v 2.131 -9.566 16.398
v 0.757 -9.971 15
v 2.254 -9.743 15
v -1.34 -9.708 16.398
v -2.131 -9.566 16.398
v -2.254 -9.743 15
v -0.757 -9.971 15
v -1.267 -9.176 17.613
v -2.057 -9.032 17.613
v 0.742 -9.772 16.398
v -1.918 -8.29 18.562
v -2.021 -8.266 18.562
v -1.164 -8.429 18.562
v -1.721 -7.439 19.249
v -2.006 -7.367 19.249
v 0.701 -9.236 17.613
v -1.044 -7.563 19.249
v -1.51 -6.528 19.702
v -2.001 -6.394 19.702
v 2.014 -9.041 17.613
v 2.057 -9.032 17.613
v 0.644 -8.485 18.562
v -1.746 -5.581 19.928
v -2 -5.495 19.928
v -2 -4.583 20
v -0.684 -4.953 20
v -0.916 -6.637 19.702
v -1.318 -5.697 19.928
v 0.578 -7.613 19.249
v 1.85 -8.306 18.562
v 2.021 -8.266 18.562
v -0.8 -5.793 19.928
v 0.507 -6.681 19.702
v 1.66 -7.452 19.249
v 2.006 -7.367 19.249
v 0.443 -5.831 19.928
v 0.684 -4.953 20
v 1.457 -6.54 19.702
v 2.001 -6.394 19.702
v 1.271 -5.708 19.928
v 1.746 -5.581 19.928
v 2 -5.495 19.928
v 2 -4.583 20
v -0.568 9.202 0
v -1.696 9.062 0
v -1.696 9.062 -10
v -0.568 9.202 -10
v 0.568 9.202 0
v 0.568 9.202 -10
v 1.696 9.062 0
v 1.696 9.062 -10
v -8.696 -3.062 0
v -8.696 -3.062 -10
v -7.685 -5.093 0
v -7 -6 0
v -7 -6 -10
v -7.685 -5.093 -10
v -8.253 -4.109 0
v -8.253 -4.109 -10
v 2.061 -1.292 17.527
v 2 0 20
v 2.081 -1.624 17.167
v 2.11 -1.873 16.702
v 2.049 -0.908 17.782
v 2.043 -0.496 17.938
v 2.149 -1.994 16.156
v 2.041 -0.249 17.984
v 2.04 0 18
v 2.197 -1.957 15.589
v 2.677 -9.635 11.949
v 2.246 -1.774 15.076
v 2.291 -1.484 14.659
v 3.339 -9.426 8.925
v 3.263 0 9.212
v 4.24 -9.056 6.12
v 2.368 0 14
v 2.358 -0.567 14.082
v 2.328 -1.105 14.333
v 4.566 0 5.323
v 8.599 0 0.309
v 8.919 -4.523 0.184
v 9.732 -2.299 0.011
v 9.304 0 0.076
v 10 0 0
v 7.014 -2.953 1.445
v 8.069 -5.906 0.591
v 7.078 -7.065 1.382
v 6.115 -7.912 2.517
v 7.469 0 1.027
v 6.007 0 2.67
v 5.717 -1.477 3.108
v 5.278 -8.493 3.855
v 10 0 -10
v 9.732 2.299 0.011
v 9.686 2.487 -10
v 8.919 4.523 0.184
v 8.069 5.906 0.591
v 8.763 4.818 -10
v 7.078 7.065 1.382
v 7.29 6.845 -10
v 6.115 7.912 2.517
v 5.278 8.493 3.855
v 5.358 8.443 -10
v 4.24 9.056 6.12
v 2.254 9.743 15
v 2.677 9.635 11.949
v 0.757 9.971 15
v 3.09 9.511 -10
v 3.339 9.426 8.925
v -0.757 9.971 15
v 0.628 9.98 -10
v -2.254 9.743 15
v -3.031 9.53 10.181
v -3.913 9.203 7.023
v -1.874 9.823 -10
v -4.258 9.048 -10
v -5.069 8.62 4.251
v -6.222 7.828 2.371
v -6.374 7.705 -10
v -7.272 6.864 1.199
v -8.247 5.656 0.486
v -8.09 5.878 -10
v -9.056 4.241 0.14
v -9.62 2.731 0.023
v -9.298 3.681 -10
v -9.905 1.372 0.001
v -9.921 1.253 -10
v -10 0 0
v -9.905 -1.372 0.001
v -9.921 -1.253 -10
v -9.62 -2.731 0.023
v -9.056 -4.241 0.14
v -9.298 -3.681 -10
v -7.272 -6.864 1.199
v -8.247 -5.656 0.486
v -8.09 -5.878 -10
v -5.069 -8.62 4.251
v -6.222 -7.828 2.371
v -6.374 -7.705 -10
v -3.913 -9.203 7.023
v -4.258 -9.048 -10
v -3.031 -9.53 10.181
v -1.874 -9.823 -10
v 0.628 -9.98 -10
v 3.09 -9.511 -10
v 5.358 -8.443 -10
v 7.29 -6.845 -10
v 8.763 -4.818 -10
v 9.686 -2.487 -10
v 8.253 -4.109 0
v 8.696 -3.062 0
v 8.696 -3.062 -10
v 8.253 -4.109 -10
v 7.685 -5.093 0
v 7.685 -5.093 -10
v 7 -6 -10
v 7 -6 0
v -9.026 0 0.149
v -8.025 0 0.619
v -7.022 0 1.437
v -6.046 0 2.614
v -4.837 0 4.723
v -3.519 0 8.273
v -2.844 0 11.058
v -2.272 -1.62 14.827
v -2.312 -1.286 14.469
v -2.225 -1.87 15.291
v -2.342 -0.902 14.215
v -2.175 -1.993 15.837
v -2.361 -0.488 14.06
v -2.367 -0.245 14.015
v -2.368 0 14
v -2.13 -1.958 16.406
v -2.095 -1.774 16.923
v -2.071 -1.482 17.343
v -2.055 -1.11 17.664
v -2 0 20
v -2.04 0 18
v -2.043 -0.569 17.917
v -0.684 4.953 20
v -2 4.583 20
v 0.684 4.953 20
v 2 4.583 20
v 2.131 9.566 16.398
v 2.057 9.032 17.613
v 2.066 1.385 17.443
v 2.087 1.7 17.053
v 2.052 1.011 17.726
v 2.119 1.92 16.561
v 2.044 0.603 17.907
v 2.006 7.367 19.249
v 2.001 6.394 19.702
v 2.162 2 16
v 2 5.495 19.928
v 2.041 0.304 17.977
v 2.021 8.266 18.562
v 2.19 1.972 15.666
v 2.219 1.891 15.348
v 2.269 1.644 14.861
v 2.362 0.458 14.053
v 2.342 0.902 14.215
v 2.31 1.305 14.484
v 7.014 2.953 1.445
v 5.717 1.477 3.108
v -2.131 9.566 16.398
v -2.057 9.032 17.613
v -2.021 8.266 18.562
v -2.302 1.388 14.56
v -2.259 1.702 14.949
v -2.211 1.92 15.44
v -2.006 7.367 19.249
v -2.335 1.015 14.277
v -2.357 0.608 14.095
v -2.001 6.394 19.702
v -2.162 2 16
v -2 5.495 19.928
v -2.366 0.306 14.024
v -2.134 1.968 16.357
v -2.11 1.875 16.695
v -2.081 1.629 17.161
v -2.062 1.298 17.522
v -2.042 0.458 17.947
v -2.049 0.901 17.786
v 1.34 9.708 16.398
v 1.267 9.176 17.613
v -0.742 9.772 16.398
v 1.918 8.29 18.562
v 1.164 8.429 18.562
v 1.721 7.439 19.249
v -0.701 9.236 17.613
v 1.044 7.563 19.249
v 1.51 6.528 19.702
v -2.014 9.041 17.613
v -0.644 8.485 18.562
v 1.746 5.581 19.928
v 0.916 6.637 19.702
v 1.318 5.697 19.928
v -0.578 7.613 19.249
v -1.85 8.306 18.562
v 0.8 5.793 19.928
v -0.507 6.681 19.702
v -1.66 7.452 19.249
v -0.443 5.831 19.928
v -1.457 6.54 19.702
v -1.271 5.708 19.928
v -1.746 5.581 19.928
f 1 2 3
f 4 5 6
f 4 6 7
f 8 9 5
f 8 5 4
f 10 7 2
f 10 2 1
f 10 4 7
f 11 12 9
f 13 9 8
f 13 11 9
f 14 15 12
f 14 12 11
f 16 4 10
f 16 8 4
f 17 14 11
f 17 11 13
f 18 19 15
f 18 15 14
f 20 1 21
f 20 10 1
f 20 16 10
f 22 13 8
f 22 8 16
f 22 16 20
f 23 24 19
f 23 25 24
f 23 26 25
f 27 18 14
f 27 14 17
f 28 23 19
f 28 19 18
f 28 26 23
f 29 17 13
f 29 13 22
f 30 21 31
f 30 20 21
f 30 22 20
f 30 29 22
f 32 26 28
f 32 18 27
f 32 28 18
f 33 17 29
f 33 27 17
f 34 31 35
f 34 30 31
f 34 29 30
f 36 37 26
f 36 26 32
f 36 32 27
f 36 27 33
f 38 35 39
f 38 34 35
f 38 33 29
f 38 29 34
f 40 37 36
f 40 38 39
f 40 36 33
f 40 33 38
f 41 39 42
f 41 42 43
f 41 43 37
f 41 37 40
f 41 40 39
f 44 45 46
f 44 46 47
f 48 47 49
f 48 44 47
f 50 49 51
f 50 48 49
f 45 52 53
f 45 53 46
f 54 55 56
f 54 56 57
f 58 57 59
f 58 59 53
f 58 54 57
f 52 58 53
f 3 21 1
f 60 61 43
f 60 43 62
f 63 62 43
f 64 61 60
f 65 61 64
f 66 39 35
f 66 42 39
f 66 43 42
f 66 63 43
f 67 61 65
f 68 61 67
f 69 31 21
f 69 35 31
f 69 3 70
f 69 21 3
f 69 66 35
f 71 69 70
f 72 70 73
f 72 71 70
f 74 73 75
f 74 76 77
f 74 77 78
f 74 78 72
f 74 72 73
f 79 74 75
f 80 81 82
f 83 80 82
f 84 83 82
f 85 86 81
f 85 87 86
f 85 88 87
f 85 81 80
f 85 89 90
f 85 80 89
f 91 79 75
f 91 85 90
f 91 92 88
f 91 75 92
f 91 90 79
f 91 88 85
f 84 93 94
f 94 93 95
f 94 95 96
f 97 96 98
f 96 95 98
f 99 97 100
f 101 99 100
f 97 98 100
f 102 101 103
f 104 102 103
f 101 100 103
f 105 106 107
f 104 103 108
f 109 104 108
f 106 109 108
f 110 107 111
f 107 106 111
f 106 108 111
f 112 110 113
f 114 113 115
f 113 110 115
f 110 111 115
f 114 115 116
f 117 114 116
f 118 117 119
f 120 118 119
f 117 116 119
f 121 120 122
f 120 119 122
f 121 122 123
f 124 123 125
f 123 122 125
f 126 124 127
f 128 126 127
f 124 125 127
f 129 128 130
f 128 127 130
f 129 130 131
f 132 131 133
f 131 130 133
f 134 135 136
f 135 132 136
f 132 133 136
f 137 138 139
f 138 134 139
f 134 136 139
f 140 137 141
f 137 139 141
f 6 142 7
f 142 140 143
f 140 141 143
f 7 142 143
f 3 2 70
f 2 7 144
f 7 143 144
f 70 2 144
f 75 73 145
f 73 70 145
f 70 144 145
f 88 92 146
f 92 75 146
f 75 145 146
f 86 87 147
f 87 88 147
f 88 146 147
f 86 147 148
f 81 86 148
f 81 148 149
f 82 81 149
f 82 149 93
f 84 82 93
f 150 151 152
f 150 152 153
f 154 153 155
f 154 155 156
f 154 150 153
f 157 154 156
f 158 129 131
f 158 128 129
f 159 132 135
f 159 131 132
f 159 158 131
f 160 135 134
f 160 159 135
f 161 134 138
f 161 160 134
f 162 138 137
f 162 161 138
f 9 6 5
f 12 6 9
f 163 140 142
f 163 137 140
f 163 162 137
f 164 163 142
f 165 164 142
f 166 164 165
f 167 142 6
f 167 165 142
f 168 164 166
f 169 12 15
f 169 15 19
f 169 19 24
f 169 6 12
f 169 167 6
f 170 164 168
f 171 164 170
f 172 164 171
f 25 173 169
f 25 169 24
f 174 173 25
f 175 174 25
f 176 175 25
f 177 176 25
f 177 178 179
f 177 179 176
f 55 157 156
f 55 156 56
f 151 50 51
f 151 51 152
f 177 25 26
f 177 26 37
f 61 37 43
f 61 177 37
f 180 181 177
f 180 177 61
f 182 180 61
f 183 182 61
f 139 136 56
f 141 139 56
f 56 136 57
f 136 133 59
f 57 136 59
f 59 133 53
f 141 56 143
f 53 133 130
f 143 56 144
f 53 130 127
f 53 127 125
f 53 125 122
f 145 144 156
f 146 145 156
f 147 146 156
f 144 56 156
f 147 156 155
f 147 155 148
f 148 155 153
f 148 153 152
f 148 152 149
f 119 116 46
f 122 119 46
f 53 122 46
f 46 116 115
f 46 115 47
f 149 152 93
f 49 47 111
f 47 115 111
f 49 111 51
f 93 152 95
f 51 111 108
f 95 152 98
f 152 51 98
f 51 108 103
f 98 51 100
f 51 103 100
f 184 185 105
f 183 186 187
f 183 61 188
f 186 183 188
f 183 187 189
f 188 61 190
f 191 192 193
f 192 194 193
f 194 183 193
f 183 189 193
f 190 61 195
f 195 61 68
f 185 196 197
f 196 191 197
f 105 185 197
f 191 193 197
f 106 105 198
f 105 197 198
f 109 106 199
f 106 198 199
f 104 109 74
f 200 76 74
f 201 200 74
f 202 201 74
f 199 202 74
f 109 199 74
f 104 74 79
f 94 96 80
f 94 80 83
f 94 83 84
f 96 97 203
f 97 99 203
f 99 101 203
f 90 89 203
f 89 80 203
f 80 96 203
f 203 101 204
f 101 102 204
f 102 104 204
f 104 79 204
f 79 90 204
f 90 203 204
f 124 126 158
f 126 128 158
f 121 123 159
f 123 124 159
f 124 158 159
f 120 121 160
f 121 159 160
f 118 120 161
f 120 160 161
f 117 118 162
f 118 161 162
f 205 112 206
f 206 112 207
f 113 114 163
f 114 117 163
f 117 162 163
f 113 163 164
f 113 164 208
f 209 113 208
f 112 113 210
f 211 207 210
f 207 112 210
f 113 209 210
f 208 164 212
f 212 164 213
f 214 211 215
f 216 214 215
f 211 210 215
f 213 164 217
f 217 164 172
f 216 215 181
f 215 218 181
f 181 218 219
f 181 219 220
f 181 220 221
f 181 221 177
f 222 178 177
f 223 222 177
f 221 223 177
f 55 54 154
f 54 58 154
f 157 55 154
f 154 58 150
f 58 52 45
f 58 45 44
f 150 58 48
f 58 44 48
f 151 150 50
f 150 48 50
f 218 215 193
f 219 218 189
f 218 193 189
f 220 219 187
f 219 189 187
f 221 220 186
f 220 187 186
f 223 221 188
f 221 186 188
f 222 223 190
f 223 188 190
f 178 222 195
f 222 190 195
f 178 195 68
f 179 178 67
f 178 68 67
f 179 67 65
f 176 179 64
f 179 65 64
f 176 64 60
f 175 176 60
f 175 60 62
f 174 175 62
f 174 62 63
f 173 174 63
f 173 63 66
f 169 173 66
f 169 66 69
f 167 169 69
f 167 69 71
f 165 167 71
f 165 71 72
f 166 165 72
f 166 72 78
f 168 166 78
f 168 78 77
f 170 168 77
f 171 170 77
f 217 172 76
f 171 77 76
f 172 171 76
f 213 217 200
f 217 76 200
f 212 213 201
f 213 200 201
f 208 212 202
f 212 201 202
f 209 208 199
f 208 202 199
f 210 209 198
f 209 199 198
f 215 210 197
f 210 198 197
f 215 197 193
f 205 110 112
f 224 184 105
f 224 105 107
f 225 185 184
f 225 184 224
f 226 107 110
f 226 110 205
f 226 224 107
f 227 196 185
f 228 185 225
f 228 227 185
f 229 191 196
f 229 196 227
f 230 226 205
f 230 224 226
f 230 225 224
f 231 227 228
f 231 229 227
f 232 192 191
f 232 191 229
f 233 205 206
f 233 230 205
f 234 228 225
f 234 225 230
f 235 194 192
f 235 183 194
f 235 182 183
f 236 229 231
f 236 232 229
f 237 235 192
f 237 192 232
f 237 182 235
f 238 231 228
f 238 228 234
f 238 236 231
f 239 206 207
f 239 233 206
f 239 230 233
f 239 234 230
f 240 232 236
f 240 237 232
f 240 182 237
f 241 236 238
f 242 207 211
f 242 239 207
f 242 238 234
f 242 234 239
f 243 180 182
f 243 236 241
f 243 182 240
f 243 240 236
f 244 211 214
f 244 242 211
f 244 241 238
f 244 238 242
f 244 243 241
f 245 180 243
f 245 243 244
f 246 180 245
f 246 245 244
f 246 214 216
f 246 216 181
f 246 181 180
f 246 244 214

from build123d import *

# Parameters (mm, degrees)
F2_R     = 10
F3_DEPTH = 10
F4_DEPTH = 20
F6_DEPTH = 12.5
F7_R     = 2
F8_DEPTH = 12.5
F9_R     = 5


with BuildPart() as f3:
    # F2 (on Top) → F3 (new body)
    with BuildSketch(Plane.XY):
        Circle(F2_R)
        with BuildLine():
            ThreePointArc((7, -6), (0, -9.2195444573), (-7, -6))
            ThreePointArc((-7, -6), (-7.9843597113, -4.6097722286), (-8.6961524227, -3.0621778265))
            ThreePointArc((-8.6961524227, -3.0621778265), (-7.9843597113, 4.6097722286), (-1.6961524227, 9.0621778265))
            ThreePointArc((-1.6961524227, 9.0621778265), (0, 9.2195444573), (1.6961524227, 9.0621778265))
            ThreePointArc((1.6961524227, 9.0621778265), (7.0935799378, 5.8890681492), (9.2195444573, 0))
            ThreePointArc((9.2195444573, 0), (9.0877545045, -1.553292653), (8.6961524227, -3.0621778265))
            ThreePointArc((8.6961524227, -3.0621778265), (7.9843597113, -4.6097722286), (7, -6))
        make_face(mode=Mode.SUBTRACT)
        with BuildLine():
            Line((-8.6961524227, -3.0621778265), (-5.1961524227, 3))
            Line((-5.1961524227, 3), (-1.6961524227, 9.0621778265))
            ThreePointArc((-1.6961524227, 9.0621778265), (-7.9843597113, 4.6097722286), (-8.6961524227, -3.0621778265))
        make_face()
        with BuildLine():
            Line((7, -6), (0, -6))
            Line((0, -6), (-7, -6))
            ThreePointArc((-7, -6), (0, -9.2195444573), (7, -6))
        make_face()
        with BuildLine():
            Line((1.6961524227, 9.0621778265), (5.1961524227, 3))
            Line((5.1961524227, 3), (8.6961524227, -3.0621778265))
            ThreePointArc((8.6961524227, -3.0621778265), (9.0877545045, -1.553292653), (9.2195444573, 0))
            ThreePointArc((9.2195444573, 0), (7.0935799378, 5.8890681492), (1.6961524227, 9.0621778265))
        make_face()
    extrude(amount=-F3_DEPTH)

    # F2 (on Top) → F4 (join)
    with BuildSketch(Plane.XY):
        Circle(F2_R)
        with BuildLine():
            ThreePointArc((7, -6), (0, -9.2195444573), (-7, -6))
            ThreePointArc((-7, -6), (-7.9843597113, -4.6097722286), (-8.6961524227, -3.0621778265))
            ThreePointArc((-8.6961524227, -3.0621778265), (-7.9843597113, 4.6097722286), (-1.6961524227, 9.0621778265))
            ThreePointArc((-1.6961524227, 9.0621778265), (0, 9.2195444573), (1.6961524227, 9.0621778265))
            ThreePointArc((1.6961524227, 9.0621778265), (7.0935799378, 5.8890681492), (9.2195444573, 0))
            ThreePointArc((9.2195444573, 0), (9.0877545045, -1.553292653), (8.6961524227, -3.0621778265))
            ThreePointArc((8.6961524227, -3.0621778265), (7.9843597113, -4.6097722286), (7, -6))
        make_face(mode=Mode.SUBTRACT)
        with BuildLine():
            Line((0, -6), (0, 0))
            Line((0, 0), (-5.1961524227, 3))
            Line((-5.1961524227, 3), (-8.6961524227, -3.0621778265))
            ThreePointArc((-8.6961524227, -3.0621778265), (-7.9843597113, -4.6097722286), (-7, -6))
            Line((-7, -6), (0, -6))
        make_face()
        with BuildLine():
            Line((-8.6961524227, -3.0621778265), (-5.1961524227, 3))
            Line((-5.1961524227, 3), (-1.6961524227, 9.0621778265))
            ThreePointArc((-1.6961524227, 9.0621778265), (-7.9843597113, 4.6097722286), (-8.6961524227, -3.0621778265))
        make_face()
        with BuildLine():
            Line((-5.1961524227, 3), (0, 0))
            Line((0, 0), (5.1961524227, 3))
            Line((5.1961524227, 3), (1.6961524227, 9.0621778265))
            ThreePointArc((1.6961524227, 9.0621778265), (0, 9.2195444573), (-1.6961524227, 9.0621778265))
            Line((-1.6961524227, 9.0621778265), (-5.1961524227, 3))
        make_face()
        with BuildLine():
            Line((5.1961524227, 3), (0, 0))
            Line((0, 0), (0, -6))
            Line((0, -6), (7, -6))
            ThreePointArc((7, -6), (7.9843597113, -4.6097722286), (8.6961524227, -3.0621778265))
            Line((8.6961524227, -3.0621778265), (5.1961524227, 3))
        make_face()
        with BuildLine():
            Line((1.6961524227, 9.0621778265), (5.1961524227, 3))
            Line((5.1961524227, 3), (8.6961524227, -3.0621778265))
            ThreePointArc((8.6961524227, -3.0621778265), (9.0877545045, -1.553292653), (9.2195444573, 0))
            ThreePointArc((9.2195444573, 0), (7.0935799378, 5.8890681492), (1.6961524227, 9.0621778265))
        make_face()
        with BuildLine():
            Line((7, -6), (0, -6))
            Line((0, -6), (-7, -6))
            ThreePointArc((-7, -6), (0, -9.2195444573), (7, -6))
        make_face()
    extrude(amount=F4_DEPTH)

    # F5 (on Front) → F6 (cut, symmetric)
    with BuildSketch(Plane.XZ):
        with BuildLine():
            Line((-10, 0), (-10, 20))
            Line((-10, 20), (-2, 20))
            add(Edge.make_bspline(
                [(-2, 20), (-2, 68.2842712475), (-15.6568542495, 34.1421356237), (-29.313708499, 0), (-10, 0)],
                knots=[4.7123889804, 4.7123889804, 4.7123889804, 7.0685834706, 7.0685834706, 9.4247779608, 9.4247779608, 9.4247779608], degree=2, weights=[1, 0.3826834324, 1, 0.3826834324, 1]))
        make_face()
        with BuildLine():
            Line((-2, 20), (-10, 20))
            Line((-10, 20), (-10, 0))
            add(Edge.make_bspline(
                [(-10, 0), (-2, 0), (-2, 20)],
                knots=[3.1415926536, 3.1415926536, 3.1415926536, 4.7123889804, 4.7123889804, 4.7123889804], degree=2, weights=[1, 0.7071067812, 1]))
        make_face()
        with BuildLine():
            add(Edge.make_bspline(
                [(2, 20), (2, -14.6410161514), (14, 2.6794919243), (26, 20), (14, 37.3205080757), (2, 54.6410161514), (2, 20)],
                knots=[4.7123889804, 4.7123889804, 4.7123889804, 6.8067840828, 6.8067840828, 8.9011791852, 8.9011791852, 10.9955742876, 10.9955742876, 10.9955742876], degree=2, weights=[1, 0.5, 1, 0.5, 1, 0.5, 1]))
        make_face()
    extrude(amount=F6_DEPTH, both=True, mode=Mode.SUBTRACT)

    # F7 (on Right) → F8 (cut, symmetric)
    with BuildSketch(Plane.YZ):
        with Locations((0, 16)):
            Circle(F7_R)
    extrude(amount=F8_DEPTH, both=True, mode=Mode.SUBTRACT)

    # F9
    f9_edges = [f3.edges().sort_by_distance(p)[0] for p in [
        (0, 10, 20),
        (0, -10, 20),
    ]]
    fillet(f9_edges, radius=F9_R)


solid = f3.part
